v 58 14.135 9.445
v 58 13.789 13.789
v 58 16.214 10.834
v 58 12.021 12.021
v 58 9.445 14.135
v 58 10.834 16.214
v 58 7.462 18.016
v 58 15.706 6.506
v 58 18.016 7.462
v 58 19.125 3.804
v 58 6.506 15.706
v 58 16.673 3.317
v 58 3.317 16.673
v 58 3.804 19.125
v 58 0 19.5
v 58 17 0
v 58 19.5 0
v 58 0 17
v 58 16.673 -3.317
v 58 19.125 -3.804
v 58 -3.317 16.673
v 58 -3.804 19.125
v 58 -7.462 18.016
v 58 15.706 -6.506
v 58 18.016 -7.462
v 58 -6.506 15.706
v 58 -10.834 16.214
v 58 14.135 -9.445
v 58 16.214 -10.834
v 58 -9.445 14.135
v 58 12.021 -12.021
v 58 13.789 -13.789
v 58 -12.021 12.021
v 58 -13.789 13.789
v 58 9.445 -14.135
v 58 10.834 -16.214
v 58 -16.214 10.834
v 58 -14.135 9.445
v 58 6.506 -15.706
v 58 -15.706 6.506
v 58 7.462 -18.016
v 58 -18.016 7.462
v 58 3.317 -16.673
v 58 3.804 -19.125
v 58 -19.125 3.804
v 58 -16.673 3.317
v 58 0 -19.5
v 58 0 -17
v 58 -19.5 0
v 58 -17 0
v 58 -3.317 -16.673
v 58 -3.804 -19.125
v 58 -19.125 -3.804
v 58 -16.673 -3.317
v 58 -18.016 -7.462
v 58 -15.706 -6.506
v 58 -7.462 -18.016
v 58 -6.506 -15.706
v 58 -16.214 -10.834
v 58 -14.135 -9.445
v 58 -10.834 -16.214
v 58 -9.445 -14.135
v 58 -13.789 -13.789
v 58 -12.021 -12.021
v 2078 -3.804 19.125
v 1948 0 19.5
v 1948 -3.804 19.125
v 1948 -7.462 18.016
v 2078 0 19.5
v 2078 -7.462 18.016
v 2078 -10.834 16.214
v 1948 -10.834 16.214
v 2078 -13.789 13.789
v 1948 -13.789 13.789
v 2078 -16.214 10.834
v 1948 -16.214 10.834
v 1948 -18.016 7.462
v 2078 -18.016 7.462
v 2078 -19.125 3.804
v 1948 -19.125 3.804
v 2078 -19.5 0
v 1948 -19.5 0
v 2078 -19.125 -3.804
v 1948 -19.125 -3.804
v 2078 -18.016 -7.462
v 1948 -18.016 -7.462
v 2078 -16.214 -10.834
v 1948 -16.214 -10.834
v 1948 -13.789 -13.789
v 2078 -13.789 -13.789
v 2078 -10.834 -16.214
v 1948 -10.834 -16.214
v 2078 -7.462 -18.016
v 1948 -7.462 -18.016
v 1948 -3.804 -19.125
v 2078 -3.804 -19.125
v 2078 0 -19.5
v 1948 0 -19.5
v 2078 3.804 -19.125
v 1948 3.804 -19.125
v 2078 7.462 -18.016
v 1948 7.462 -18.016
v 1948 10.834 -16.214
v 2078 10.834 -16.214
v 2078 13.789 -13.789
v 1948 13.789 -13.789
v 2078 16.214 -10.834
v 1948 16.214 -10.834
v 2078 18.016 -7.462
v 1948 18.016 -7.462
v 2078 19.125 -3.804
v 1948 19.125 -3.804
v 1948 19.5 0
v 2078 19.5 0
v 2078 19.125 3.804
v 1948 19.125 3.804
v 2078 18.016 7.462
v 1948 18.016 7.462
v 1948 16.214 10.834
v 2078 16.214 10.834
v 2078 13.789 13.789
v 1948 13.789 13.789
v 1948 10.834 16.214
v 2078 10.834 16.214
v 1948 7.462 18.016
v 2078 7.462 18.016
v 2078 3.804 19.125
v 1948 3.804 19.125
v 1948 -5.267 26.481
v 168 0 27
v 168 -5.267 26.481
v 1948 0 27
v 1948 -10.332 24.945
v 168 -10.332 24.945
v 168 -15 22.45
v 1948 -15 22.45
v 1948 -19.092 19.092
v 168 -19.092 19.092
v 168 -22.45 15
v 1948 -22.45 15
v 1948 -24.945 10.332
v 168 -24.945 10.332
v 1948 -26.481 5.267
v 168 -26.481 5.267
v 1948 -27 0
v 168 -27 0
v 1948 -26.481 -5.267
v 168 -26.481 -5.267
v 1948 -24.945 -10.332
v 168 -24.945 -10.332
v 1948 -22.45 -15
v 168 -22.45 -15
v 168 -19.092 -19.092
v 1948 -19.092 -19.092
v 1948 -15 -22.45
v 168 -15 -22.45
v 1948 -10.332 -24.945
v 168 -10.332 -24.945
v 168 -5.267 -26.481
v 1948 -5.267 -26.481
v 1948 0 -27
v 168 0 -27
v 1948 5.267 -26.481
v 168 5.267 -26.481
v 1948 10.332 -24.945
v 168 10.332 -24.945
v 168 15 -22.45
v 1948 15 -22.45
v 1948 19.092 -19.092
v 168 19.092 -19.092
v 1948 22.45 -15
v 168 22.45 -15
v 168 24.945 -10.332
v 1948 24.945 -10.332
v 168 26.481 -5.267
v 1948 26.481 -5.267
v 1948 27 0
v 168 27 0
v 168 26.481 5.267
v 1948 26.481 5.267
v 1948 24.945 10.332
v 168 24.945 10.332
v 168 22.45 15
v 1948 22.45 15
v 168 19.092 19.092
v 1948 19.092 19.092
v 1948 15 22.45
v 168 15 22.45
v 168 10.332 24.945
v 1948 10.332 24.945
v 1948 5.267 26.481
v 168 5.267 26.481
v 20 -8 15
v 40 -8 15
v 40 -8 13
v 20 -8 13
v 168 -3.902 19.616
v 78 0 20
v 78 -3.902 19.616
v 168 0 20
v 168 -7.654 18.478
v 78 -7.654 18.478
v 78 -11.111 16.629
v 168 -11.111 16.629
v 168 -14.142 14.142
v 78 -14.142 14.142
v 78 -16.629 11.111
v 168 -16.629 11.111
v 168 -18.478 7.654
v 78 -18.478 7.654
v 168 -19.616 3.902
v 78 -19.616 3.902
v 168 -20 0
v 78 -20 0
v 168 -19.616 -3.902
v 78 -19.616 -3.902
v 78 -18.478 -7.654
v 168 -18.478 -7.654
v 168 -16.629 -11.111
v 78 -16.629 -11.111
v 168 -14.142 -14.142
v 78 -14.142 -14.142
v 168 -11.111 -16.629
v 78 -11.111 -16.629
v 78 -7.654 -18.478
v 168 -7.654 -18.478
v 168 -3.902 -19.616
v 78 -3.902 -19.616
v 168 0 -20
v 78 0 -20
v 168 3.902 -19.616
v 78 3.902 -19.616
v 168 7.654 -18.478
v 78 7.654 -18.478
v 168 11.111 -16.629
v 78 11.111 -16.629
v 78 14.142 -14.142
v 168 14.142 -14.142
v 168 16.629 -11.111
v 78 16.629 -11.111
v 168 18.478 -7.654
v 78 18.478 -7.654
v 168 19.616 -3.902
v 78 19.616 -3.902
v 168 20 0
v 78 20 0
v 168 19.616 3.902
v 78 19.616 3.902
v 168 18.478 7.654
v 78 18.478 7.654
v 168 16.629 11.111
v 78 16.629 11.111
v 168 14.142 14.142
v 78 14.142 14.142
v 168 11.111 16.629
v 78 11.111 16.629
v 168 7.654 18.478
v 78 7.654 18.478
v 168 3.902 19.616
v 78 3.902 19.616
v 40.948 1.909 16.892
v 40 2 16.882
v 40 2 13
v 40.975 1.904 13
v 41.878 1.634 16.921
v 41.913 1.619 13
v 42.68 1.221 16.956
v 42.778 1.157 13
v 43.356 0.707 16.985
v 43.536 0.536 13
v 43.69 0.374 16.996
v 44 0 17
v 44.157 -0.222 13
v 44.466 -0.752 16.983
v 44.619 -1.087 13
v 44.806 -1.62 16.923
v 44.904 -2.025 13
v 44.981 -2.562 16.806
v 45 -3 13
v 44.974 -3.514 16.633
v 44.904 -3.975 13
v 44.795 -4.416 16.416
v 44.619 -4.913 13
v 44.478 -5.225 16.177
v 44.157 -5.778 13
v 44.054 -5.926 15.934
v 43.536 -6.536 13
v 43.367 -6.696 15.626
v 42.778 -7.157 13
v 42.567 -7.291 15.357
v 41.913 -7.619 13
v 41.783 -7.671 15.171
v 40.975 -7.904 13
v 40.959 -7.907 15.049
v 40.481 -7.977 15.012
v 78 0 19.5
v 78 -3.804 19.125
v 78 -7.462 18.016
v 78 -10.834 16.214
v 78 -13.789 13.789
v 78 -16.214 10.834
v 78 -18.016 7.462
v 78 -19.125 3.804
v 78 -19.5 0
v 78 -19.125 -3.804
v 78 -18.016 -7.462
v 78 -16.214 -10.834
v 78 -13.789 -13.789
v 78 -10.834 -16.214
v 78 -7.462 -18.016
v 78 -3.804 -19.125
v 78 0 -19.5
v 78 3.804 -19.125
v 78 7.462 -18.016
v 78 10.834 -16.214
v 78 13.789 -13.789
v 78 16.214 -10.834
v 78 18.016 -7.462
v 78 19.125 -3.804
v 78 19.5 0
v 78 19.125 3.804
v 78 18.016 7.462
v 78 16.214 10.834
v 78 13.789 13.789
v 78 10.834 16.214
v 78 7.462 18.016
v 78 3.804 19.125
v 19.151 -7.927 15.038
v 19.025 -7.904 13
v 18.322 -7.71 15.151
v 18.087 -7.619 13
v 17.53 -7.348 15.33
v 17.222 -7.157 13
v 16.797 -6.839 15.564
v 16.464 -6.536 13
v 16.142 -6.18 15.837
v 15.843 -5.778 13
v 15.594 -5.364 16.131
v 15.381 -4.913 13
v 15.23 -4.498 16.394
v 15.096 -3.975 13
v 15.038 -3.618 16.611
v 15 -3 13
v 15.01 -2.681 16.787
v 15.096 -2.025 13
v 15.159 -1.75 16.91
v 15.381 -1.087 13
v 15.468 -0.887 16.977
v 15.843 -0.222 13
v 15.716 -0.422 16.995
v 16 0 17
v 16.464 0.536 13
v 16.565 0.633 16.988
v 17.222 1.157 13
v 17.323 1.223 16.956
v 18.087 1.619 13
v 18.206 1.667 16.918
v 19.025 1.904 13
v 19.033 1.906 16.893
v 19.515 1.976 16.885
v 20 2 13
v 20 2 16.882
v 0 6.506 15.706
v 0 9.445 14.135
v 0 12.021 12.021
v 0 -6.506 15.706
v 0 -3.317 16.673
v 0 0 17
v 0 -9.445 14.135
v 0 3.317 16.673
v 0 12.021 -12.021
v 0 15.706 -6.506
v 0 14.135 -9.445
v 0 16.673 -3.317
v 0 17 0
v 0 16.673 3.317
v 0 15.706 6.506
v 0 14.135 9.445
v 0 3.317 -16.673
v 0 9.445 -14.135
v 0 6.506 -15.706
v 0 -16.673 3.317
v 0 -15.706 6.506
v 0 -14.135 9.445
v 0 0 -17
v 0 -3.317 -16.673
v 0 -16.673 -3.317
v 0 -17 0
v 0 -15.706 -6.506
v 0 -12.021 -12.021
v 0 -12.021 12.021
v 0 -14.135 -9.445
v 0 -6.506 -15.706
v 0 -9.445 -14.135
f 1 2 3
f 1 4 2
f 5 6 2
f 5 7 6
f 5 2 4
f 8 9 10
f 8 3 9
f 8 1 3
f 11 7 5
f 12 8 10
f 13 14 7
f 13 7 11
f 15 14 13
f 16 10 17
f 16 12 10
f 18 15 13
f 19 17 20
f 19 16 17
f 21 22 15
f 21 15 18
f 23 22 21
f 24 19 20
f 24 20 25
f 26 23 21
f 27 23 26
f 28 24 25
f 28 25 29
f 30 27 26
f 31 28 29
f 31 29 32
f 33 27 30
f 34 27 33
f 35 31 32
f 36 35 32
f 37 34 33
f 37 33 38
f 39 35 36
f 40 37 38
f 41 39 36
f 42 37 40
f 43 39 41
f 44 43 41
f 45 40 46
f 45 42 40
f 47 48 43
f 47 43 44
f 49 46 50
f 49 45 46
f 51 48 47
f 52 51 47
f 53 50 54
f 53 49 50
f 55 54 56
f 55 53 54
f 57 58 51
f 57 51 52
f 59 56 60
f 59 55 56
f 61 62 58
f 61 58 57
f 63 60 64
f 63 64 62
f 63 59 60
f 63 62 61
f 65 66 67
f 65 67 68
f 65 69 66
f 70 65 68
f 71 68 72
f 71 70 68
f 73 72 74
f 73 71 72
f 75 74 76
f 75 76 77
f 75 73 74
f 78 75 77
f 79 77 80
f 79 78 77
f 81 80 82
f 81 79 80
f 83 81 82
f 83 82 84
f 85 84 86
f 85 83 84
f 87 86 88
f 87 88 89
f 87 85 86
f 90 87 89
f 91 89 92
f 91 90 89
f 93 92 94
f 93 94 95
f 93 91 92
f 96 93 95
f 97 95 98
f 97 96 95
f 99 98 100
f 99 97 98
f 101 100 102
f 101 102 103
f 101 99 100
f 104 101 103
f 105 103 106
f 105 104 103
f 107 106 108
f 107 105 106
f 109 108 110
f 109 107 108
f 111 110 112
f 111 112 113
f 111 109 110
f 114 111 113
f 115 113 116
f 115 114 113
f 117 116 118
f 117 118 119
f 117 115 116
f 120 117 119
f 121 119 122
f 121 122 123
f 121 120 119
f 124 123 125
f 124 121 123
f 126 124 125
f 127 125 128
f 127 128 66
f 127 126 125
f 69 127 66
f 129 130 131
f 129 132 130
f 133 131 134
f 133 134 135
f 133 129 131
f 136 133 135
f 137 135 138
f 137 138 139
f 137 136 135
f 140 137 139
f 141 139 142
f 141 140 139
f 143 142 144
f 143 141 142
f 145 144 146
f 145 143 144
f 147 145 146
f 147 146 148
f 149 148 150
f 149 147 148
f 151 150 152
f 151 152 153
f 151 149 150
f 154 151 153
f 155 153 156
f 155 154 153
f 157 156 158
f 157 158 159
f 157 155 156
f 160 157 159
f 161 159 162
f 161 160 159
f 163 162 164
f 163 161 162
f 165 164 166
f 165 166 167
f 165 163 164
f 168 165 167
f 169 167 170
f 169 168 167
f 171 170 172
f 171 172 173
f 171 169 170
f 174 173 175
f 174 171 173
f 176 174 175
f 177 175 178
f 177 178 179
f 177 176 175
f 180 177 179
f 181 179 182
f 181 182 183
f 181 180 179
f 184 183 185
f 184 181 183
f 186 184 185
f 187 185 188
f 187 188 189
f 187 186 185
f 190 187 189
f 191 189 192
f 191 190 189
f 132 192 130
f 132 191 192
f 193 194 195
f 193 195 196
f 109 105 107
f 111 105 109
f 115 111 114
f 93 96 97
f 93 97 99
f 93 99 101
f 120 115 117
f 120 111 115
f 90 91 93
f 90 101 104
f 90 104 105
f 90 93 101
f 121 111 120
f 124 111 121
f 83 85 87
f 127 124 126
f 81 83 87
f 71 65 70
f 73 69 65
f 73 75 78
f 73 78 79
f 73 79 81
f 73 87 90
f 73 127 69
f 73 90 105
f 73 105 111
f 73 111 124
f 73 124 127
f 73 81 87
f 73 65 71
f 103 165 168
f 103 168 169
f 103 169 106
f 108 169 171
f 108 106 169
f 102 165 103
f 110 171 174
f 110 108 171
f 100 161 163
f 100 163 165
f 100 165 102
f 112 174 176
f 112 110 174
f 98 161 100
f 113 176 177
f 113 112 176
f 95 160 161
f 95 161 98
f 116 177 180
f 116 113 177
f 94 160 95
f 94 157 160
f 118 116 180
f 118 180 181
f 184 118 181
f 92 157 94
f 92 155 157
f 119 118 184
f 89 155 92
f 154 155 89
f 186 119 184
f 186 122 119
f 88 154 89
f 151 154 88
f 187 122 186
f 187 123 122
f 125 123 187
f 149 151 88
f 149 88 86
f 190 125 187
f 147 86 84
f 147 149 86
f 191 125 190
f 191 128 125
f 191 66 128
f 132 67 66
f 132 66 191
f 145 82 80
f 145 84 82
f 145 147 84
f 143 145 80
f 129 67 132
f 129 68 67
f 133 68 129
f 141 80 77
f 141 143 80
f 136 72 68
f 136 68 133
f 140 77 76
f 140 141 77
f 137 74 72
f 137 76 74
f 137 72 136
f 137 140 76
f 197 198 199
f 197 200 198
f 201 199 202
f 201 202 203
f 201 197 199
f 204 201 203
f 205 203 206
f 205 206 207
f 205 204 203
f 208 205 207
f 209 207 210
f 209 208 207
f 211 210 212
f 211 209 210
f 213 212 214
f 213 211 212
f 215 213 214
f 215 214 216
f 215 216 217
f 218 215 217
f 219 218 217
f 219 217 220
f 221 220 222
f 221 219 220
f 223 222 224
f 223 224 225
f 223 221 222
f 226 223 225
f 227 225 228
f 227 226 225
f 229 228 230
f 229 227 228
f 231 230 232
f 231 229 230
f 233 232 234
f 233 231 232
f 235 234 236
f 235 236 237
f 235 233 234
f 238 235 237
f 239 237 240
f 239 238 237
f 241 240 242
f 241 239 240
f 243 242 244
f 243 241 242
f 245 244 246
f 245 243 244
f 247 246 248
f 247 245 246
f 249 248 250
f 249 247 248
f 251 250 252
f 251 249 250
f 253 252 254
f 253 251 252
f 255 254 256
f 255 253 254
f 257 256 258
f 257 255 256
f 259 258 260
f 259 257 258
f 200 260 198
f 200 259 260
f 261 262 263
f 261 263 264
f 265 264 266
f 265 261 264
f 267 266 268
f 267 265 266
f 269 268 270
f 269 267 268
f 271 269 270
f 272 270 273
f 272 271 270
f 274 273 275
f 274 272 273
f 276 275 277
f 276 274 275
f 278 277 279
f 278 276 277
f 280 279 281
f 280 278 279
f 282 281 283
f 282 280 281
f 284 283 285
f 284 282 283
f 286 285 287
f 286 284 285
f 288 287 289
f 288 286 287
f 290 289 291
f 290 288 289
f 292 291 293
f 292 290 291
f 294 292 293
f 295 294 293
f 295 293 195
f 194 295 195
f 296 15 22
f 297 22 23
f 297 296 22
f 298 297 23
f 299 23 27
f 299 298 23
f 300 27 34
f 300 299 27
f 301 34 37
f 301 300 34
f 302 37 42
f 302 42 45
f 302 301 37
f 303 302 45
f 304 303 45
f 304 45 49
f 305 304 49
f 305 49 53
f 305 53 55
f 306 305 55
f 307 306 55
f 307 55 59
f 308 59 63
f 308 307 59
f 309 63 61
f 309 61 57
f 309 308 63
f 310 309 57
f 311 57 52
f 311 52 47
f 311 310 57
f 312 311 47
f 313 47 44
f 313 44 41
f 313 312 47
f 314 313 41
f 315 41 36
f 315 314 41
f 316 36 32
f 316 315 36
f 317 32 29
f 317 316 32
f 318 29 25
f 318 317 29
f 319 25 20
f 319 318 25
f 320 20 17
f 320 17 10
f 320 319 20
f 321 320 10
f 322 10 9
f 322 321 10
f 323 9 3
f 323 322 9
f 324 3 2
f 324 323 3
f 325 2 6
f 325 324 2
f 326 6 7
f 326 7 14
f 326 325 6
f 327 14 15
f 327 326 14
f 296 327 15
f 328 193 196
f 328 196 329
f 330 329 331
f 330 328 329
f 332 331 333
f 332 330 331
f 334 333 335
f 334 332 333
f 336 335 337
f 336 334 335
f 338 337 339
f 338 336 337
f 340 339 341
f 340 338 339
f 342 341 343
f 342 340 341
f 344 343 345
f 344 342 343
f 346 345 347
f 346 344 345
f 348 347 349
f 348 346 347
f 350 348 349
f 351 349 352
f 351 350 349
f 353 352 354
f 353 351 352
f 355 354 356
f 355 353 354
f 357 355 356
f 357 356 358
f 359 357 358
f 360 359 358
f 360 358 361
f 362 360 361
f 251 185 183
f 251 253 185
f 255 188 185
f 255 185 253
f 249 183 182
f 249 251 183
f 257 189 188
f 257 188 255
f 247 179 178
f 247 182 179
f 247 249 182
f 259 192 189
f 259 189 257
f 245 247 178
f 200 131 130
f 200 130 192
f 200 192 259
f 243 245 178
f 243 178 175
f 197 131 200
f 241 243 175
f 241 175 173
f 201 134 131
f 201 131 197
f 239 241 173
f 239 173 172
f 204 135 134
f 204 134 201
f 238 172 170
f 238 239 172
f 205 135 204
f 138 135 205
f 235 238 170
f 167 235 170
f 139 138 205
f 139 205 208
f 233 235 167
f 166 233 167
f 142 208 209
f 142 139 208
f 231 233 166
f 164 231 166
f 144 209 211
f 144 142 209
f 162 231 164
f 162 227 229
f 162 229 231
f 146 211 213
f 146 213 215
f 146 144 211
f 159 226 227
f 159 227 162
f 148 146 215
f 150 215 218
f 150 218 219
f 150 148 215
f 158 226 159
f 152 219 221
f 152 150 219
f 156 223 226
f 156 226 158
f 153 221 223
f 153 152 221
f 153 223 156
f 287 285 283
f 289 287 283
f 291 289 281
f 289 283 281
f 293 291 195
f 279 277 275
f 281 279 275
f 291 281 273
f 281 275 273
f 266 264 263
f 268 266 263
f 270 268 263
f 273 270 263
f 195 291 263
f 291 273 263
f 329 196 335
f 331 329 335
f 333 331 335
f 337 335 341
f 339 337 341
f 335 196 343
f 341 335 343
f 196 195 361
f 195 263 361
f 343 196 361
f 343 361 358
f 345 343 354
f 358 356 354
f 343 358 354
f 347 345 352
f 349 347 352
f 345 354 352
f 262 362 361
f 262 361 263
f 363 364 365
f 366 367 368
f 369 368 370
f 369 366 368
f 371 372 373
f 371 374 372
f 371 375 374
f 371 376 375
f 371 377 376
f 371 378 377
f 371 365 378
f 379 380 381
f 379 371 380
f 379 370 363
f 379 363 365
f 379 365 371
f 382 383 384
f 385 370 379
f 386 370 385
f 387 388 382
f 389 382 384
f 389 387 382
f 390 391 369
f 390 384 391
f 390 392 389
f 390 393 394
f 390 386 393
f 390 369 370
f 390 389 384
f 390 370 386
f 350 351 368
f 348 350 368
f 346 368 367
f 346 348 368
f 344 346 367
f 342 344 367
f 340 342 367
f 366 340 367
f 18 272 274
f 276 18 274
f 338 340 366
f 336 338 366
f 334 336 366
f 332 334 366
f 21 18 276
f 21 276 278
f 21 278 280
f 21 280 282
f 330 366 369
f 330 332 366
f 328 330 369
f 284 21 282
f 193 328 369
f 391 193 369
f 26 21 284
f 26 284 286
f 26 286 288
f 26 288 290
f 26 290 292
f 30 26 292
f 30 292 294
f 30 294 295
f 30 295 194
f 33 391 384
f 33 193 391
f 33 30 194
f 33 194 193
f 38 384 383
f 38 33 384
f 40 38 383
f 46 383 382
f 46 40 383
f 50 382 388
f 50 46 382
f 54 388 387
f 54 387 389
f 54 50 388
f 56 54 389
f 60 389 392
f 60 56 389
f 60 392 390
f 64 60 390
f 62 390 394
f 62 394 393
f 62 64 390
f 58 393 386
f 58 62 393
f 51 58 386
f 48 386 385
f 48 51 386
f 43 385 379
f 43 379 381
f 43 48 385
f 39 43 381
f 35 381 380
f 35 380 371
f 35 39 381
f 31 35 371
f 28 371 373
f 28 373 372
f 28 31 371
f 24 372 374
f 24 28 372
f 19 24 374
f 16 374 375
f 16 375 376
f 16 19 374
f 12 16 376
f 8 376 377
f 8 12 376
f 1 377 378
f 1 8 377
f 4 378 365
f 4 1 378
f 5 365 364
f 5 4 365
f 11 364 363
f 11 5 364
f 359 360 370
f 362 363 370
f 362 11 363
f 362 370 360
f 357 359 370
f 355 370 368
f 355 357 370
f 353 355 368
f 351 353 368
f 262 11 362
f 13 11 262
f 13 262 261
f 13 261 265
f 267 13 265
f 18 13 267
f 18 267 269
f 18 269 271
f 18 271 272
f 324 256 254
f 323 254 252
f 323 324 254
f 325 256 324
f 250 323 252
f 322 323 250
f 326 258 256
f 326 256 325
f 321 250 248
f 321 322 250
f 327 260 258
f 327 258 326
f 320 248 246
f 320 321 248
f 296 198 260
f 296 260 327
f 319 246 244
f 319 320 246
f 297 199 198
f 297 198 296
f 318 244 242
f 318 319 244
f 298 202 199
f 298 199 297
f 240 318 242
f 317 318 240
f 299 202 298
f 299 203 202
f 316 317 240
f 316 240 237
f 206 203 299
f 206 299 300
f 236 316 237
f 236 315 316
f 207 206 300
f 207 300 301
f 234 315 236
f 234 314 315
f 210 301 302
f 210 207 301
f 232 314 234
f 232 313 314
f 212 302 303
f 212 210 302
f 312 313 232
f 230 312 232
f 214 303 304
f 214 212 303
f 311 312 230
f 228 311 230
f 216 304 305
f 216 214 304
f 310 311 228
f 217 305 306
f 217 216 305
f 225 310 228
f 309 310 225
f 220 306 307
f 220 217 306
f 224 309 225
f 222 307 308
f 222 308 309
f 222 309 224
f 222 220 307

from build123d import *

# Parameters (mm, degrees)
CUT_EXTRUDE_1_DEPTH = 4


with BuildPart() as part:
    # 草图2 → 旋转5 (revolve)
    with BuildSketch(Plane.XY, mode=Mode.PRIVATE) as revolve_5_sk:
        Polygon((0, 0), (0, 17), (58, 17), (58, 19.5), (78, 19.5), (78, 20), (168, 20), (168, 27), (1948, 27), (1948, 19.5), (2078, 19.5), (2078, 0), align=None)
    revolve(revolve_5_sk.sketch.rotate(Axis((41.300309891, 0, 0), (1, 0, 0)), 90), axis=Axis((41.300309891, 0, 0), (1, 0, 0)))

    # 草图3 → 切除-拉伸1 (cut)
    with BuildSketch(Plane.XY.offset(17)):
        with BuildLine():
            Line((20, 2), (40, 2))
            ThreePointArc((40, 2), (45, -3), (40, -8))
            Line((40, -8), (20, -8))
            ThreePointArc((20, -8), (15, -3), (20, 2))
        make_face()
    extrude(amount=-CUT_EXTRUDE_1_DEPTH, mode=Mode.SUBTRACT)


solid = part.part
